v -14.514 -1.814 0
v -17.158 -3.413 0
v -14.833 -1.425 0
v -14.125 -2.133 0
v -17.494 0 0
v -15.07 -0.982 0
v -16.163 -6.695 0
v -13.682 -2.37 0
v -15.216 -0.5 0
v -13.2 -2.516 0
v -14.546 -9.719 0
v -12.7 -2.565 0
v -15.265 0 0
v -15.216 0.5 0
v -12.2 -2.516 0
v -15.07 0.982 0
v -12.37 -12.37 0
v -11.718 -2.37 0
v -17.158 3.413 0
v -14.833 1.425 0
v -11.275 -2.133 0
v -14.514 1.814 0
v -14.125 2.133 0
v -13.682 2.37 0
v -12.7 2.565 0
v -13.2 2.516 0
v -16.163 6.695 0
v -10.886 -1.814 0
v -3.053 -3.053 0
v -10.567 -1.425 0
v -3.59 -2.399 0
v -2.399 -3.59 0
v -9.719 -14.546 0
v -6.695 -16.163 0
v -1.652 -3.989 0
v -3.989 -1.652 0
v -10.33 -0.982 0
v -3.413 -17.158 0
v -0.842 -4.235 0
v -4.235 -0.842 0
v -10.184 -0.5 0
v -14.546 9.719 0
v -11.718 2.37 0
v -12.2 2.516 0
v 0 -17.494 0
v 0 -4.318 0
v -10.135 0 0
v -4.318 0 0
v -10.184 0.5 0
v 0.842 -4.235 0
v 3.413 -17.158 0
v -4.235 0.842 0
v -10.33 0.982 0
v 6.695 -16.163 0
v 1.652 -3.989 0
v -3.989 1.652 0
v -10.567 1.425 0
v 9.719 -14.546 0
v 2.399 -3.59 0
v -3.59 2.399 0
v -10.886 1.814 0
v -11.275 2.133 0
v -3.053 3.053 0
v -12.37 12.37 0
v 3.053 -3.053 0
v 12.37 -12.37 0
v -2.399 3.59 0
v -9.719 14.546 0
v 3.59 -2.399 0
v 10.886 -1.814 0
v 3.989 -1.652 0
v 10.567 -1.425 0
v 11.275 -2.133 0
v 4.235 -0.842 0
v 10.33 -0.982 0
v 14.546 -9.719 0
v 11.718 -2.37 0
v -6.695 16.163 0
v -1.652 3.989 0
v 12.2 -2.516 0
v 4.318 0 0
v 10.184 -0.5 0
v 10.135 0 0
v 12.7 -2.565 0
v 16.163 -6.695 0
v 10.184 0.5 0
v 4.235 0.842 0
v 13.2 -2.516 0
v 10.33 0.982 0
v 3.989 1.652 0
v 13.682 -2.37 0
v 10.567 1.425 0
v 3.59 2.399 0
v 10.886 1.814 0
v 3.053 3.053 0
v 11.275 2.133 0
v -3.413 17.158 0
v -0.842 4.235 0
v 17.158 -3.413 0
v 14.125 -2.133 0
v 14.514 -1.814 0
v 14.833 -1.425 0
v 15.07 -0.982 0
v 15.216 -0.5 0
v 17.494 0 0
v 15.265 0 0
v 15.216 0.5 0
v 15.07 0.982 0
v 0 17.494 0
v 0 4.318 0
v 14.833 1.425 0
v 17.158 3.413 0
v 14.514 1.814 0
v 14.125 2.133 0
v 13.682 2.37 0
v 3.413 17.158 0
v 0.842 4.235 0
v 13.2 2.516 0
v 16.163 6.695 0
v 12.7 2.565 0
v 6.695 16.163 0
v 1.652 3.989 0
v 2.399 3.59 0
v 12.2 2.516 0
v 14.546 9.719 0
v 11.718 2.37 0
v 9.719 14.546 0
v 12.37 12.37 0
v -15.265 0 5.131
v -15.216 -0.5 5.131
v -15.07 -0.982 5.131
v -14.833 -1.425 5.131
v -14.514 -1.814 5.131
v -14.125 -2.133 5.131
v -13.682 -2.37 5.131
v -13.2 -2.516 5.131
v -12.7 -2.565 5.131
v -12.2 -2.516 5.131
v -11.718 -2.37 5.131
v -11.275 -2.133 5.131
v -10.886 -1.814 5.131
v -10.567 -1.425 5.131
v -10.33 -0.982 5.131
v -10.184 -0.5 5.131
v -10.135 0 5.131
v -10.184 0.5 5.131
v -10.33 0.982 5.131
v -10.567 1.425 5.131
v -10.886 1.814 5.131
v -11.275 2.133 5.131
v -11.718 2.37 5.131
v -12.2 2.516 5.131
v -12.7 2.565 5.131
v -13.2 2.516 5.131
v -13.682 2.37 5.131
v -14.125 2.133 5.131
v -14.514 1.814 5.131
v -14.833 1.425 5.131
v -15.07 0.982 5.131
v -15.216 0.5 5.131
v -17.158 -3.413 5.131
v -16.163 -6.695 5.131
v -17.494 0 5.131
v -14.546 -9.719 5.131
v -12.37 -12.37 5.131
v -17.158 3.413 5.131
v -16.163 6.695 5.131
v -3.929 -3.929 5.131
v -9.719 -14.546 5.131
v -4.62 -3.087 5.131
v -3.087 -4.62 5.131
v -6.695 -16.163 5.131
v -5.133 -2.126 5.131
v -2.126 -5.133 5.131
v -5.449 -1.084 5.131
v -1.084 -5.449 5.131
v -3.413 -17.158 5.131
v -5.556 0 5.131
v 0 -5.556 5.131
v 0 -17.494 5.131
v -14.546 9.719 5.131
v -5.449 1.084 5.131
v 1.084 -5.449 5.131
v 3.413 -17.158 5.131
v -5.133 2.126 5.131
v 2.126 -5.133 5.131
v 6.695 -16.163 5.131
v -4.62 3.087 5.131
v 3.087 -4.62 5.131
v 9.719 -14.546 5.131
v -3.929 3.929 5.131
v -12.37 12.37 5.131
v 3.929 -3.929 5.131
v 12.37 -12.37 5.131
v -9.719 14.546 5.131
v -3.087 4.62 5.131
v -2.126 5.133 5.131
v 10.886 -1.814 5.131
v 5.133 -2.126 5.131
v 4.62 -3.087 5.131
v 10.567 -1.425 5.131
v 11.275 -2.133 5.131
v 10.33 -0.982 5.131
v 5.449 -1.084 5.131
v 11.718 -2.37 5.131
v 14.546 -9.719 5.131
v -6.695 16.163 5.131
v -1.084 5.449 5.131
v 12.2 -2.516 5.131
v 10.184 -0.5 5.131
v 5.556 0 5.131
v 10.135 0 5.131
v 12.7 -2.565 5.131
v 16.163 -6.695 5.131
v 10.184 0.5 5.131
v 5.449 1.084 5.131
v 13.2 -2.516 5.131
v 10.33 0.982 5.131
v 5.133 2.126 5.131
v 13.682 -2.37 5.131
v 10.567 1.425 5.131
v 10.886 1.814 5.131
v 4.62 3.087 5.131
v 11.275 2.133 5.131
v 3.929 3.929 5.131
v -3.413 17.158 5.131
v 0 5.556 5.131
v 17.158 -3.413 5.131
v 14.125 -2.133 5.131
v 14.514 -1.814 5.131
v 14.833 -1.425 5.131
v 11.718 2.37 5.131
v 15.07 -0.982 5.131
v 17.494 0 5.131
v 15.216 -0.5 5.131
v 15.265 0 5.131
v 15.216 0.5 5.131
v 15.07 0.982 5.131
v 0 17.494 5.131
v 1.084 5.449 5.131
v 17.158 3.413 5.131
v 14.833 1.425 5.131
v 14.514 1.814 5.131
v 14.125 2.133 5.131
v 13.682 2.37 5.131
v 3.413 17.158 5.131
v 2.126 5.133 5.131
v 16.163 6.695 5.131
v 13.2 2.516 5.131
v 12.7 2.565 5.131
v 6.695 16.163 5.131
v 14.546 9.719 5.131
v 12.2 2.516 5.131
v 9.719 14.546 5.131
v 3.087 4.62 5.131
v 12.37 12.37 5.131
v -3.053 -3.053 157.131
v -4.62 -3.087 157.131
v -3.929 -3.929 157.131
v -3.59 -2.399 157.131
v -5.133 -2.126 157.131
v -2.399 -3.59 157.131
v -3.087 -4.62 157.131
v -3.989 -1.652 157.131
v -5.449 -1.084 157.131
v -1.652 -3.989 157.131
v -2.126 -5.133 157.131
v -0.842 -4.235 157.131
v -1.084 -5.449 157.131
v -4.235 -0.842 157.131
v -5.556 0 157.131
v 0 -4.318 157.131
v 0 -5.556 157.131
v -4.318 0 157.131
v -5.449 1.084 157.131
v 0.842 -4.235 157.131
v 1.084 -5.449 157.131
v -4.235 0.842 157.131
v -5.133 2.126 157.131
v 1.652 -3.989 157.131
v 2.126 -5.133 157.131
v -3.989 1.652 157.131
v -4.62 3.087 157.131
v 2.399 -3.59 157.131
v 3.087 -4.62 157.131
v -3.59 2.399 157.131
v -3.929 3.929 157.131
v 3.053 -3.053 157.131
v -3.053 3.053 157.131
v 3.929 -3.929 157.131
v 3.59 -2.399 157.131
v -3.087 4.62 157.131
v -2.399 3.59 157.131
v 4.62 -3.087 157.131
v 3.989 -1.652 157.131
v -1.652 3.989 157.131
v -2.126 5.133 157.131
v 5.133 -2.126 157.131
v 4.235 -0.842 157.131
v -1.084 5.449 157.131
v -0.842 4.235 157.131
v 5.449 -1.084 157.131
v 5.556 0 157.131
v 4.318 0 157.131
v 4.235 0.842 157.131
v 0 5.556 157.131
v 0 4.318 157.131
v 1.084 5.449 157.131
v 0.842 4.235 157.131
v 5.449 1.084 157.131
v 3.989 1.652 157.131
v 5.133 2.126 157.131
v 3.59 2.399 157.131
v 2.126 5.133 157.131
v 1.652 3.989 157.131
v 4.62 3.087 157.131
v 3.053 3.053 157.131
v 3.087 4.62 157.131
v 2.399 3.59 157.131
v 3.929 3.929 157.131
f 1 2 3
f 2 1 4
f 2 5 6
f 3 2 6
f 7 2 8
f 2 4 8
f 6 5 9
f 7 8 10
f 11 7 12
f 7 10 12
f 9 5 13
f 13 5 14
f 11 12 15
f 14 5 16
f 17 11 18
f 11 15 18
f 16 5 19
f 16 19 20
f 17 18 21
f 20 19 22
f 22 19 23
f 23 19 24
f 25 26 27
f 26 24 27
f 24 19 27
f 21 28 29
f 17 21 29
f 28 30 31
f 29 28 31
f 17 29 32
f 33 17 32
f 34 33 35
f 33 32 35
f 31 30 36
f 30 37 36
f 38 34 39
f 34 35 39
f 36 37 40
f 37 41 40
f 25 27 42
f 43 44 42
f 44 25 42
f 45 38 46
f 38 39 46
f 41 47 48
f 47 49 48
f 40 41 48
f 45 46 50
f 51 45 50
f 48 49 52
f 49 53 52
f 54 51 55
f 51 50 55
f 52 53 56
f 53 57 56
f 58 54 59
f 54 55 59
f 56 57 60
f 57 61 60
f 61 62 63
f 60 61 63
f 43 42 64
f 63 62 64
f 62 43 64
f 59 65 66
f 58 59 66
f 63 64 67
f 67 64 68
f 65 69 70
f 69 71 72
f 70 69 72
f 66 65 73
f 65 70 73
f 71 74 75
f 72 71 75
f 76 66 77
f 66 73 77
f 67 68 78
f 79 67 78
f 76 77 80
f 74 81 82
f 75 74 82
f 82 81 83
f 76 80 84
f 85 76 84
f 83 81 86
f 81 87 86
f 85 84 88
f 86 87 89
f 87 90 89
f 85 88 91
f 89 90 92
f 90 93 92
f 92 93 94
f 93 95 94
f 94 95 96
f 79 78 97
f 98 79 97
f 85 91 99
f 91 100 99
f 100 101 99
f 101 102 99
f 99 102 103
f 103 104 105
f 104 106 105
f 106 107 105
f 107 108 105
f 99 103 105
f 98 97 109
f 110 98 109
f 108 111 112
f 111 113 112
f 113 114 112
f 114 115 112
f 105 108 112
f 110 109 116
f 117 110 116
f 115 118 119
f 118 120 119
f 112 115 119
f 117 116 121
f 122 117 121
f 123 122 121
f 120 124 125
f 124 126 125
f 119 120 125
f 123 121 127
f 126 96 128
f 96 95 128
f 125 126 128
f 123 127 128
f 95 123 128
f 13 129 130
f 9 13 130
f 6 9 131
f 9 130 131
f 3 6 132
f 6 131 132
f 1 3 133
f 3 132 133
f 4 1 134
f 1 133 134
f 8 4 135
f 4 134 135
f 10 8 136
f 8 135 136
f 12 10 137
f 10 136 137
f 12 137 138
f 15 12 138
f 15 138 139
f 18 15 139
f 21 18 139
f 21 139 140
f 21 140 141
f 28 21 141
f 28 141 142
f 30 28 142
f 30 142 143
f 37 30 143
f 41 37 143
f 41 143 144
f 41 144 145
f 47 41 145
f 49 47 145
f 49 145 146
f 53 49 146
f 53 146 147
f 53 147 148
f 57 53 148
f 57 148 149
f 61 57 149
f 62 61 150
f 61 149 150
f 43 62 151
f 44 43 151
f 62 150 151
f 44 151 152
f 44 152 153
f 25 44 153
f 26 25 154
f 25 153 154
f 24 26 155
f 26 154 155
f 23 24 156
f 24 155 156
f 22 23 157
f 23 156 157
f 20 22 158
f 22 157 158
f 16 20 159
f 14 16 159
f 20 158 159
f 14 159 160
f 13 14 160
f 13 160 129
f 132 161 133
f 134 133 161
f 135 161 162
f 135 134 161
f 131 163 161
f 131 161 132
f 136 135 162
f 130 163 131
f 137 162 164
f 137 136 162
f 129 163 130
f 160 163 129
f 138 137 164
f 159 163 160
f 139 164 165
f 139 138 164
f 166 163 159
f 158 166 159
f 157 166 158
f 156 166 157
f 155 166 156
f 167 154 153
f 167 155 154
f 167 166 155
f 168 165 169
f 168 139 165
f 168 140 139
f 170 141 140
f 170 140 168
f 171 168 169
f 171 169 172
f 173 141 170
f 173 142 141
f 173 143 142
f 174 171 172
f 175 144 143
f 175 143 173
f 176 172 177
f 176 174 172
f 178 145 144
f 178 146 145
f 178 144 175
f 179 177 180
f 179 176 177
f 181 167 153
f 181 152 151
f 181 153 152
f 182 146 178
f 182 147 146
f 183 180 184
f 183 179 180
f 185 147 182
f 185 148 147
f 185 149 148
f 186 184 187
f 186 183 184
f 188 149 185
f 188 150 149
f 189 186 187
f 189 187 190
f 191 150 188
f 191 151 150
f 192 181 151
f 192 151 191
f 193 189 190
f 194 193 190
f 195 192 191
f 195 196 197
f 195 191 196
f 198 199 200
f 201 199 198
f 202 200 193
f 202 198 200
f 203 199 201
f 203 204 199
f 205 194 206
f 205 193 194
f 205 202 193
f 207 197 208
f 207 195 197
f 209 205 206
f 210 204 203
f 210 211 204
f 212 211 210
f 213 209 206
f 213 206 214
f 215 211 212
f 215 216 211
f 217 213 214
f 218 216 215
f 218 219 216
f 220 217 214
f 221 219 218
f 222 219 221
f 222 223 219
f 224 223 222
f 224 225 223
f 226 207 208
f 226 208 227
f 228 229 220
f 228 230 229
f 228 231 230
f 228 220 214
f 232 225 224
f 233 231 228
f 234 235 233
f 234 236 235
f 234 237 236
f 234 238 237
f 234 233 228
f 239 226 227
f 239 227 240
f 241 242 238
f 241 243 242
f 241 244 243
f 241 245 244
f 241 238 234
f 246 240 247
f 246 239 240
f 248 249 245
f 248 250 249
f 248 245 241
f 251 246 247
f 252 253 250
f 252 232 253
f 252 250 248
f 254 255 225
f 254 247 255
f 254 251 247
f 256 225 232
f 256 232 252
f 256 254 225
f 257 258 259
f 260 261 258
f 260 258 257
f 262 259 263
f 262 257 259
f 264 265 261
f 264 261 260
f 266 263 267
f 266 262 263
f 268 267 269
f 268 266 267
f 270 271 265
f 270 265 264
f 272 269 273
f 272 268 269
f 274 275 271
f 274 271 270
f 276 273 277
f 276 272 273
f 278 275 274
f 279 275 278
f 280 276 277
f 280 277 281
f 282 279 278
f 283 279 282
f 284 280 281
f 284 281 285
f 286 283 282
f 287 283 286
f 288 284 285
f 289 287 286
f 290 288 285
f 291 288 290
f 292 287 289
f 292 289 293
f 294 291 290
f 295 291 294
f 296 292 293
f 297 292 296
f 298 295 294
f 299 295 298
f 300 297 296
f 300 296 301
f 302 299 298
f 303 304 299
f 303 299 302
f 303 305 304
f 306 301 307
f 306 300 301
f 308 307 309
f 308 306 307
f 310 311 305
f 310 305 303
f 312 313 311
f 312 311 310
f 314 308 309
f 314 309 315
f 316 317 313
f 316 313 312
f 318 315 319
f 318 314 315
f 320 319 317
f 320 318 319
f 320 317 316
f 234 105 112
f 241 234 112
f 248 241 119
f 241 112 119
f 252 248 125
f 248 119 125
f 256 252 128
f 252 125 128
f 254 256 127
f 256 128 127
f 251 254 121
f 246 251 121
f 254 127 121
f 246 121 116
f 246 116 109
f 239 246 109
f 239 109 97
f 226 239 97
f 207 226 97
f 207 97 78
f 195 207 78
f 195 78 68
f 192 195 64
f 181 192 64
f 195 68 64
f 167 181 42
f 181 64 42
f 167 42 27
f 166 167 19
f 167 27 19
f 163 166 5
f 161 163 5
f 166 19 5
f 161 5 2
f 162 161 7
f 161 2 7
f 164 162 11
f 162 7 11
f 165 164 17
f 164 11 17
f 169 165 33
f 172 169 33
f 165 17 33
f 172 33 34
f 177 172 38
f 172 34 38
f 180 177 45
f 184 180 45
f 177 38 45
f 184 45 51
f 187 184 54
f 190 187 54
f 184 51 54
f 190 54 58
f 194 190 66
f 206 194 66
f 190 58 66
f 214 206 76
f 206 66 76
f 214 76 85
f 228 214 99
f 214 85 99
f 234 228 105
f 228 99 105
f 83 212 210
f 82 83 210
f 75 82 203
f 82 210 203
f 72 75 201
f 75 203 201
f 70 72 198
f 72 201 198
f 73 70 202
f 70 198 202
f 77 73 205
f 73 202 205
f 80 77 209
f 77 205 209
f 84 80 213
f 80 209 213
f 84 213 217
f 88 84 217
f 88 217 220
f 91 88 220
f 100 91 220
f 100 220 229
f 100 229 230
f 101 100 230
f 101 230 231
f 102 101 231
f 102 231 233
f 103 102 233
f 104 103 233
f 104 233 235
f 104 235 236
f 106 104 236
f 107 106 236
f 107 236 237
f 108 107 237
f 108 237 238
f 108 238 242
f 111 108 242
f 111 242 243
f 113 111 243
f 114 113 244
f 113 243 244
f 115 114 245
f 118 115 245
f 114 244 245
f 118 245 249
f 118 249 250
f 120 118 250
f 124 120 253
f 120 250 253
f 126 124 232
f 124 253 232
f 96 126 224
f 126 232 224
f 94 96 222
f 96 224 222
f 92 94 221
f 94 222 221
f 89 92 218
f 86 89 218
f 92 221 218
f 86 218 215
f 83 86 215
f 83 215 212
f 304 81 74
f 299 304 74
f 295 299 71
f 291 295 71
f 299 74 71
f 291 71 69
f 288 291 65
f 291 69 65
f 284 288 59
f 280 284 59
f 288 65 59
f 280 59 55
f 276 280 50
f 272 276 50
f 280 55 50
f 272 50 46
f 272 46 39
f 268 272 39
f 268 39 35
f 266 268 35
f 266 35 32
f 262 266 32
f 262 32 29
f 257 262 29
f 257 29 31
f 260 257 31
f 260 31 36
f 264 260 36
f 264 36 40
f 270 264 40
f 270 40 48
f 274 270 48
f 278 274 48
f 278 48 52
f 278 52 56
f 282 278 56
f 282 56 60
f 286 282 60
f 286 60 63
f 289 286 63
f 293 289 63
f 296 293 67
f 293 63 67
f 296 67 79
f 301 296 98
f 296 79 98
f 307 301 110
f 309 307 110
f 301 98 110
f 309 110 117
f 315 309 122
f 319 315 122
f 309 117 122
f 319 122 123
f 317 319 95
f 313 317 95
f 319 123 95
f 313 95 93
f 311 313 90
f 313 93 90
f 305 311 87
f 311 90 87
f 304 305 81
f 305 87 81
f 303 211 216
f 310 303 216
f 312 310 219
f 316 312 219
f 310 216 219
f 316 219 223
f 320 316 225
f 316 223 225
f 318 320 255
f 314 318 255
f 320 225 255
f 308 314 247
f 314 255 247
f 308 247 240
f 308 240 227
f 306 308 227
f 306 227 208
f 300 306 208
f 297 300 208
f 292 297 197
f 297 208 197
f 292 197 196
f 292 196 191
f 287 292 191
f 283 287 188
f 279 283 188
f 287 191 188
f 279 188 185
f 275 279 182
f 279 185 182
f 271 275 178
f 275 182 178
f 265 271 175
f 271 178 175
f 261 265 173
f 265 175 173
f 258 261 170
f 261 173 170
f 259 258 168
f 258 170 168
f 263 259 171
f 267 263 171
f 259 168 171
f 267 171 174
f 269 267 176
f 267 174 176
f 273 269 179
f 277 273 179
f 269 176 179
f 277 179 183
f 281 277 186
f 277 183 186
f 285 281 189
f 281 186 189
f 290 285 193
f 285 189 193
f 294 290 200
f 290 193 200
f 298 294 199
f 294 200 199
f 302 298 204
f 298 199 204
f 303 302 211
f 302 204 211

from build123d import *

# Parameters (mm, degrees)
F0_R     = 17.49425
F1_DEPTH = 5.1308
F2_R     = 5.55625
F3_DEPTH = 152
F4_R     = 4.318
F5_DEPTH = 157.1318
F7_D     = 5.1308


with BuildPart() as f1:
    # F0 (on Top) → F1 (new body)
    with BuildSketch(Plane.XY):
        Circle(F0_R)
    extrude(amount=F1_DEPTH)

    # F2 (on face) → F3 (join)
    with BuildSketch(Plane.XY.offset(5.1308)):
        Circle(F2_R)
    extrude(amount=F3_DEPTH)

    # F4 (on face) → F5 (cut, through all)
    with BuildSketch(Plane(origin=(0, 0, 0), x_dir=(1, 0, 0), z_dir=(0, 0, -1))):
        Circle(F4_R)
    extrude(amount=-F5_DEPTH, mode=Mode.SUBTRACT)

    # F7 (through all)
    with Locations(Plane(origin=(0, 0, 0), x_dir=(1, 0, 0), z_dir=(0, 0, -1))):
        with Locations((-12.7, 0), (12.7, 0)):
            Hole(F7_D / 2)


solid = f1.part
